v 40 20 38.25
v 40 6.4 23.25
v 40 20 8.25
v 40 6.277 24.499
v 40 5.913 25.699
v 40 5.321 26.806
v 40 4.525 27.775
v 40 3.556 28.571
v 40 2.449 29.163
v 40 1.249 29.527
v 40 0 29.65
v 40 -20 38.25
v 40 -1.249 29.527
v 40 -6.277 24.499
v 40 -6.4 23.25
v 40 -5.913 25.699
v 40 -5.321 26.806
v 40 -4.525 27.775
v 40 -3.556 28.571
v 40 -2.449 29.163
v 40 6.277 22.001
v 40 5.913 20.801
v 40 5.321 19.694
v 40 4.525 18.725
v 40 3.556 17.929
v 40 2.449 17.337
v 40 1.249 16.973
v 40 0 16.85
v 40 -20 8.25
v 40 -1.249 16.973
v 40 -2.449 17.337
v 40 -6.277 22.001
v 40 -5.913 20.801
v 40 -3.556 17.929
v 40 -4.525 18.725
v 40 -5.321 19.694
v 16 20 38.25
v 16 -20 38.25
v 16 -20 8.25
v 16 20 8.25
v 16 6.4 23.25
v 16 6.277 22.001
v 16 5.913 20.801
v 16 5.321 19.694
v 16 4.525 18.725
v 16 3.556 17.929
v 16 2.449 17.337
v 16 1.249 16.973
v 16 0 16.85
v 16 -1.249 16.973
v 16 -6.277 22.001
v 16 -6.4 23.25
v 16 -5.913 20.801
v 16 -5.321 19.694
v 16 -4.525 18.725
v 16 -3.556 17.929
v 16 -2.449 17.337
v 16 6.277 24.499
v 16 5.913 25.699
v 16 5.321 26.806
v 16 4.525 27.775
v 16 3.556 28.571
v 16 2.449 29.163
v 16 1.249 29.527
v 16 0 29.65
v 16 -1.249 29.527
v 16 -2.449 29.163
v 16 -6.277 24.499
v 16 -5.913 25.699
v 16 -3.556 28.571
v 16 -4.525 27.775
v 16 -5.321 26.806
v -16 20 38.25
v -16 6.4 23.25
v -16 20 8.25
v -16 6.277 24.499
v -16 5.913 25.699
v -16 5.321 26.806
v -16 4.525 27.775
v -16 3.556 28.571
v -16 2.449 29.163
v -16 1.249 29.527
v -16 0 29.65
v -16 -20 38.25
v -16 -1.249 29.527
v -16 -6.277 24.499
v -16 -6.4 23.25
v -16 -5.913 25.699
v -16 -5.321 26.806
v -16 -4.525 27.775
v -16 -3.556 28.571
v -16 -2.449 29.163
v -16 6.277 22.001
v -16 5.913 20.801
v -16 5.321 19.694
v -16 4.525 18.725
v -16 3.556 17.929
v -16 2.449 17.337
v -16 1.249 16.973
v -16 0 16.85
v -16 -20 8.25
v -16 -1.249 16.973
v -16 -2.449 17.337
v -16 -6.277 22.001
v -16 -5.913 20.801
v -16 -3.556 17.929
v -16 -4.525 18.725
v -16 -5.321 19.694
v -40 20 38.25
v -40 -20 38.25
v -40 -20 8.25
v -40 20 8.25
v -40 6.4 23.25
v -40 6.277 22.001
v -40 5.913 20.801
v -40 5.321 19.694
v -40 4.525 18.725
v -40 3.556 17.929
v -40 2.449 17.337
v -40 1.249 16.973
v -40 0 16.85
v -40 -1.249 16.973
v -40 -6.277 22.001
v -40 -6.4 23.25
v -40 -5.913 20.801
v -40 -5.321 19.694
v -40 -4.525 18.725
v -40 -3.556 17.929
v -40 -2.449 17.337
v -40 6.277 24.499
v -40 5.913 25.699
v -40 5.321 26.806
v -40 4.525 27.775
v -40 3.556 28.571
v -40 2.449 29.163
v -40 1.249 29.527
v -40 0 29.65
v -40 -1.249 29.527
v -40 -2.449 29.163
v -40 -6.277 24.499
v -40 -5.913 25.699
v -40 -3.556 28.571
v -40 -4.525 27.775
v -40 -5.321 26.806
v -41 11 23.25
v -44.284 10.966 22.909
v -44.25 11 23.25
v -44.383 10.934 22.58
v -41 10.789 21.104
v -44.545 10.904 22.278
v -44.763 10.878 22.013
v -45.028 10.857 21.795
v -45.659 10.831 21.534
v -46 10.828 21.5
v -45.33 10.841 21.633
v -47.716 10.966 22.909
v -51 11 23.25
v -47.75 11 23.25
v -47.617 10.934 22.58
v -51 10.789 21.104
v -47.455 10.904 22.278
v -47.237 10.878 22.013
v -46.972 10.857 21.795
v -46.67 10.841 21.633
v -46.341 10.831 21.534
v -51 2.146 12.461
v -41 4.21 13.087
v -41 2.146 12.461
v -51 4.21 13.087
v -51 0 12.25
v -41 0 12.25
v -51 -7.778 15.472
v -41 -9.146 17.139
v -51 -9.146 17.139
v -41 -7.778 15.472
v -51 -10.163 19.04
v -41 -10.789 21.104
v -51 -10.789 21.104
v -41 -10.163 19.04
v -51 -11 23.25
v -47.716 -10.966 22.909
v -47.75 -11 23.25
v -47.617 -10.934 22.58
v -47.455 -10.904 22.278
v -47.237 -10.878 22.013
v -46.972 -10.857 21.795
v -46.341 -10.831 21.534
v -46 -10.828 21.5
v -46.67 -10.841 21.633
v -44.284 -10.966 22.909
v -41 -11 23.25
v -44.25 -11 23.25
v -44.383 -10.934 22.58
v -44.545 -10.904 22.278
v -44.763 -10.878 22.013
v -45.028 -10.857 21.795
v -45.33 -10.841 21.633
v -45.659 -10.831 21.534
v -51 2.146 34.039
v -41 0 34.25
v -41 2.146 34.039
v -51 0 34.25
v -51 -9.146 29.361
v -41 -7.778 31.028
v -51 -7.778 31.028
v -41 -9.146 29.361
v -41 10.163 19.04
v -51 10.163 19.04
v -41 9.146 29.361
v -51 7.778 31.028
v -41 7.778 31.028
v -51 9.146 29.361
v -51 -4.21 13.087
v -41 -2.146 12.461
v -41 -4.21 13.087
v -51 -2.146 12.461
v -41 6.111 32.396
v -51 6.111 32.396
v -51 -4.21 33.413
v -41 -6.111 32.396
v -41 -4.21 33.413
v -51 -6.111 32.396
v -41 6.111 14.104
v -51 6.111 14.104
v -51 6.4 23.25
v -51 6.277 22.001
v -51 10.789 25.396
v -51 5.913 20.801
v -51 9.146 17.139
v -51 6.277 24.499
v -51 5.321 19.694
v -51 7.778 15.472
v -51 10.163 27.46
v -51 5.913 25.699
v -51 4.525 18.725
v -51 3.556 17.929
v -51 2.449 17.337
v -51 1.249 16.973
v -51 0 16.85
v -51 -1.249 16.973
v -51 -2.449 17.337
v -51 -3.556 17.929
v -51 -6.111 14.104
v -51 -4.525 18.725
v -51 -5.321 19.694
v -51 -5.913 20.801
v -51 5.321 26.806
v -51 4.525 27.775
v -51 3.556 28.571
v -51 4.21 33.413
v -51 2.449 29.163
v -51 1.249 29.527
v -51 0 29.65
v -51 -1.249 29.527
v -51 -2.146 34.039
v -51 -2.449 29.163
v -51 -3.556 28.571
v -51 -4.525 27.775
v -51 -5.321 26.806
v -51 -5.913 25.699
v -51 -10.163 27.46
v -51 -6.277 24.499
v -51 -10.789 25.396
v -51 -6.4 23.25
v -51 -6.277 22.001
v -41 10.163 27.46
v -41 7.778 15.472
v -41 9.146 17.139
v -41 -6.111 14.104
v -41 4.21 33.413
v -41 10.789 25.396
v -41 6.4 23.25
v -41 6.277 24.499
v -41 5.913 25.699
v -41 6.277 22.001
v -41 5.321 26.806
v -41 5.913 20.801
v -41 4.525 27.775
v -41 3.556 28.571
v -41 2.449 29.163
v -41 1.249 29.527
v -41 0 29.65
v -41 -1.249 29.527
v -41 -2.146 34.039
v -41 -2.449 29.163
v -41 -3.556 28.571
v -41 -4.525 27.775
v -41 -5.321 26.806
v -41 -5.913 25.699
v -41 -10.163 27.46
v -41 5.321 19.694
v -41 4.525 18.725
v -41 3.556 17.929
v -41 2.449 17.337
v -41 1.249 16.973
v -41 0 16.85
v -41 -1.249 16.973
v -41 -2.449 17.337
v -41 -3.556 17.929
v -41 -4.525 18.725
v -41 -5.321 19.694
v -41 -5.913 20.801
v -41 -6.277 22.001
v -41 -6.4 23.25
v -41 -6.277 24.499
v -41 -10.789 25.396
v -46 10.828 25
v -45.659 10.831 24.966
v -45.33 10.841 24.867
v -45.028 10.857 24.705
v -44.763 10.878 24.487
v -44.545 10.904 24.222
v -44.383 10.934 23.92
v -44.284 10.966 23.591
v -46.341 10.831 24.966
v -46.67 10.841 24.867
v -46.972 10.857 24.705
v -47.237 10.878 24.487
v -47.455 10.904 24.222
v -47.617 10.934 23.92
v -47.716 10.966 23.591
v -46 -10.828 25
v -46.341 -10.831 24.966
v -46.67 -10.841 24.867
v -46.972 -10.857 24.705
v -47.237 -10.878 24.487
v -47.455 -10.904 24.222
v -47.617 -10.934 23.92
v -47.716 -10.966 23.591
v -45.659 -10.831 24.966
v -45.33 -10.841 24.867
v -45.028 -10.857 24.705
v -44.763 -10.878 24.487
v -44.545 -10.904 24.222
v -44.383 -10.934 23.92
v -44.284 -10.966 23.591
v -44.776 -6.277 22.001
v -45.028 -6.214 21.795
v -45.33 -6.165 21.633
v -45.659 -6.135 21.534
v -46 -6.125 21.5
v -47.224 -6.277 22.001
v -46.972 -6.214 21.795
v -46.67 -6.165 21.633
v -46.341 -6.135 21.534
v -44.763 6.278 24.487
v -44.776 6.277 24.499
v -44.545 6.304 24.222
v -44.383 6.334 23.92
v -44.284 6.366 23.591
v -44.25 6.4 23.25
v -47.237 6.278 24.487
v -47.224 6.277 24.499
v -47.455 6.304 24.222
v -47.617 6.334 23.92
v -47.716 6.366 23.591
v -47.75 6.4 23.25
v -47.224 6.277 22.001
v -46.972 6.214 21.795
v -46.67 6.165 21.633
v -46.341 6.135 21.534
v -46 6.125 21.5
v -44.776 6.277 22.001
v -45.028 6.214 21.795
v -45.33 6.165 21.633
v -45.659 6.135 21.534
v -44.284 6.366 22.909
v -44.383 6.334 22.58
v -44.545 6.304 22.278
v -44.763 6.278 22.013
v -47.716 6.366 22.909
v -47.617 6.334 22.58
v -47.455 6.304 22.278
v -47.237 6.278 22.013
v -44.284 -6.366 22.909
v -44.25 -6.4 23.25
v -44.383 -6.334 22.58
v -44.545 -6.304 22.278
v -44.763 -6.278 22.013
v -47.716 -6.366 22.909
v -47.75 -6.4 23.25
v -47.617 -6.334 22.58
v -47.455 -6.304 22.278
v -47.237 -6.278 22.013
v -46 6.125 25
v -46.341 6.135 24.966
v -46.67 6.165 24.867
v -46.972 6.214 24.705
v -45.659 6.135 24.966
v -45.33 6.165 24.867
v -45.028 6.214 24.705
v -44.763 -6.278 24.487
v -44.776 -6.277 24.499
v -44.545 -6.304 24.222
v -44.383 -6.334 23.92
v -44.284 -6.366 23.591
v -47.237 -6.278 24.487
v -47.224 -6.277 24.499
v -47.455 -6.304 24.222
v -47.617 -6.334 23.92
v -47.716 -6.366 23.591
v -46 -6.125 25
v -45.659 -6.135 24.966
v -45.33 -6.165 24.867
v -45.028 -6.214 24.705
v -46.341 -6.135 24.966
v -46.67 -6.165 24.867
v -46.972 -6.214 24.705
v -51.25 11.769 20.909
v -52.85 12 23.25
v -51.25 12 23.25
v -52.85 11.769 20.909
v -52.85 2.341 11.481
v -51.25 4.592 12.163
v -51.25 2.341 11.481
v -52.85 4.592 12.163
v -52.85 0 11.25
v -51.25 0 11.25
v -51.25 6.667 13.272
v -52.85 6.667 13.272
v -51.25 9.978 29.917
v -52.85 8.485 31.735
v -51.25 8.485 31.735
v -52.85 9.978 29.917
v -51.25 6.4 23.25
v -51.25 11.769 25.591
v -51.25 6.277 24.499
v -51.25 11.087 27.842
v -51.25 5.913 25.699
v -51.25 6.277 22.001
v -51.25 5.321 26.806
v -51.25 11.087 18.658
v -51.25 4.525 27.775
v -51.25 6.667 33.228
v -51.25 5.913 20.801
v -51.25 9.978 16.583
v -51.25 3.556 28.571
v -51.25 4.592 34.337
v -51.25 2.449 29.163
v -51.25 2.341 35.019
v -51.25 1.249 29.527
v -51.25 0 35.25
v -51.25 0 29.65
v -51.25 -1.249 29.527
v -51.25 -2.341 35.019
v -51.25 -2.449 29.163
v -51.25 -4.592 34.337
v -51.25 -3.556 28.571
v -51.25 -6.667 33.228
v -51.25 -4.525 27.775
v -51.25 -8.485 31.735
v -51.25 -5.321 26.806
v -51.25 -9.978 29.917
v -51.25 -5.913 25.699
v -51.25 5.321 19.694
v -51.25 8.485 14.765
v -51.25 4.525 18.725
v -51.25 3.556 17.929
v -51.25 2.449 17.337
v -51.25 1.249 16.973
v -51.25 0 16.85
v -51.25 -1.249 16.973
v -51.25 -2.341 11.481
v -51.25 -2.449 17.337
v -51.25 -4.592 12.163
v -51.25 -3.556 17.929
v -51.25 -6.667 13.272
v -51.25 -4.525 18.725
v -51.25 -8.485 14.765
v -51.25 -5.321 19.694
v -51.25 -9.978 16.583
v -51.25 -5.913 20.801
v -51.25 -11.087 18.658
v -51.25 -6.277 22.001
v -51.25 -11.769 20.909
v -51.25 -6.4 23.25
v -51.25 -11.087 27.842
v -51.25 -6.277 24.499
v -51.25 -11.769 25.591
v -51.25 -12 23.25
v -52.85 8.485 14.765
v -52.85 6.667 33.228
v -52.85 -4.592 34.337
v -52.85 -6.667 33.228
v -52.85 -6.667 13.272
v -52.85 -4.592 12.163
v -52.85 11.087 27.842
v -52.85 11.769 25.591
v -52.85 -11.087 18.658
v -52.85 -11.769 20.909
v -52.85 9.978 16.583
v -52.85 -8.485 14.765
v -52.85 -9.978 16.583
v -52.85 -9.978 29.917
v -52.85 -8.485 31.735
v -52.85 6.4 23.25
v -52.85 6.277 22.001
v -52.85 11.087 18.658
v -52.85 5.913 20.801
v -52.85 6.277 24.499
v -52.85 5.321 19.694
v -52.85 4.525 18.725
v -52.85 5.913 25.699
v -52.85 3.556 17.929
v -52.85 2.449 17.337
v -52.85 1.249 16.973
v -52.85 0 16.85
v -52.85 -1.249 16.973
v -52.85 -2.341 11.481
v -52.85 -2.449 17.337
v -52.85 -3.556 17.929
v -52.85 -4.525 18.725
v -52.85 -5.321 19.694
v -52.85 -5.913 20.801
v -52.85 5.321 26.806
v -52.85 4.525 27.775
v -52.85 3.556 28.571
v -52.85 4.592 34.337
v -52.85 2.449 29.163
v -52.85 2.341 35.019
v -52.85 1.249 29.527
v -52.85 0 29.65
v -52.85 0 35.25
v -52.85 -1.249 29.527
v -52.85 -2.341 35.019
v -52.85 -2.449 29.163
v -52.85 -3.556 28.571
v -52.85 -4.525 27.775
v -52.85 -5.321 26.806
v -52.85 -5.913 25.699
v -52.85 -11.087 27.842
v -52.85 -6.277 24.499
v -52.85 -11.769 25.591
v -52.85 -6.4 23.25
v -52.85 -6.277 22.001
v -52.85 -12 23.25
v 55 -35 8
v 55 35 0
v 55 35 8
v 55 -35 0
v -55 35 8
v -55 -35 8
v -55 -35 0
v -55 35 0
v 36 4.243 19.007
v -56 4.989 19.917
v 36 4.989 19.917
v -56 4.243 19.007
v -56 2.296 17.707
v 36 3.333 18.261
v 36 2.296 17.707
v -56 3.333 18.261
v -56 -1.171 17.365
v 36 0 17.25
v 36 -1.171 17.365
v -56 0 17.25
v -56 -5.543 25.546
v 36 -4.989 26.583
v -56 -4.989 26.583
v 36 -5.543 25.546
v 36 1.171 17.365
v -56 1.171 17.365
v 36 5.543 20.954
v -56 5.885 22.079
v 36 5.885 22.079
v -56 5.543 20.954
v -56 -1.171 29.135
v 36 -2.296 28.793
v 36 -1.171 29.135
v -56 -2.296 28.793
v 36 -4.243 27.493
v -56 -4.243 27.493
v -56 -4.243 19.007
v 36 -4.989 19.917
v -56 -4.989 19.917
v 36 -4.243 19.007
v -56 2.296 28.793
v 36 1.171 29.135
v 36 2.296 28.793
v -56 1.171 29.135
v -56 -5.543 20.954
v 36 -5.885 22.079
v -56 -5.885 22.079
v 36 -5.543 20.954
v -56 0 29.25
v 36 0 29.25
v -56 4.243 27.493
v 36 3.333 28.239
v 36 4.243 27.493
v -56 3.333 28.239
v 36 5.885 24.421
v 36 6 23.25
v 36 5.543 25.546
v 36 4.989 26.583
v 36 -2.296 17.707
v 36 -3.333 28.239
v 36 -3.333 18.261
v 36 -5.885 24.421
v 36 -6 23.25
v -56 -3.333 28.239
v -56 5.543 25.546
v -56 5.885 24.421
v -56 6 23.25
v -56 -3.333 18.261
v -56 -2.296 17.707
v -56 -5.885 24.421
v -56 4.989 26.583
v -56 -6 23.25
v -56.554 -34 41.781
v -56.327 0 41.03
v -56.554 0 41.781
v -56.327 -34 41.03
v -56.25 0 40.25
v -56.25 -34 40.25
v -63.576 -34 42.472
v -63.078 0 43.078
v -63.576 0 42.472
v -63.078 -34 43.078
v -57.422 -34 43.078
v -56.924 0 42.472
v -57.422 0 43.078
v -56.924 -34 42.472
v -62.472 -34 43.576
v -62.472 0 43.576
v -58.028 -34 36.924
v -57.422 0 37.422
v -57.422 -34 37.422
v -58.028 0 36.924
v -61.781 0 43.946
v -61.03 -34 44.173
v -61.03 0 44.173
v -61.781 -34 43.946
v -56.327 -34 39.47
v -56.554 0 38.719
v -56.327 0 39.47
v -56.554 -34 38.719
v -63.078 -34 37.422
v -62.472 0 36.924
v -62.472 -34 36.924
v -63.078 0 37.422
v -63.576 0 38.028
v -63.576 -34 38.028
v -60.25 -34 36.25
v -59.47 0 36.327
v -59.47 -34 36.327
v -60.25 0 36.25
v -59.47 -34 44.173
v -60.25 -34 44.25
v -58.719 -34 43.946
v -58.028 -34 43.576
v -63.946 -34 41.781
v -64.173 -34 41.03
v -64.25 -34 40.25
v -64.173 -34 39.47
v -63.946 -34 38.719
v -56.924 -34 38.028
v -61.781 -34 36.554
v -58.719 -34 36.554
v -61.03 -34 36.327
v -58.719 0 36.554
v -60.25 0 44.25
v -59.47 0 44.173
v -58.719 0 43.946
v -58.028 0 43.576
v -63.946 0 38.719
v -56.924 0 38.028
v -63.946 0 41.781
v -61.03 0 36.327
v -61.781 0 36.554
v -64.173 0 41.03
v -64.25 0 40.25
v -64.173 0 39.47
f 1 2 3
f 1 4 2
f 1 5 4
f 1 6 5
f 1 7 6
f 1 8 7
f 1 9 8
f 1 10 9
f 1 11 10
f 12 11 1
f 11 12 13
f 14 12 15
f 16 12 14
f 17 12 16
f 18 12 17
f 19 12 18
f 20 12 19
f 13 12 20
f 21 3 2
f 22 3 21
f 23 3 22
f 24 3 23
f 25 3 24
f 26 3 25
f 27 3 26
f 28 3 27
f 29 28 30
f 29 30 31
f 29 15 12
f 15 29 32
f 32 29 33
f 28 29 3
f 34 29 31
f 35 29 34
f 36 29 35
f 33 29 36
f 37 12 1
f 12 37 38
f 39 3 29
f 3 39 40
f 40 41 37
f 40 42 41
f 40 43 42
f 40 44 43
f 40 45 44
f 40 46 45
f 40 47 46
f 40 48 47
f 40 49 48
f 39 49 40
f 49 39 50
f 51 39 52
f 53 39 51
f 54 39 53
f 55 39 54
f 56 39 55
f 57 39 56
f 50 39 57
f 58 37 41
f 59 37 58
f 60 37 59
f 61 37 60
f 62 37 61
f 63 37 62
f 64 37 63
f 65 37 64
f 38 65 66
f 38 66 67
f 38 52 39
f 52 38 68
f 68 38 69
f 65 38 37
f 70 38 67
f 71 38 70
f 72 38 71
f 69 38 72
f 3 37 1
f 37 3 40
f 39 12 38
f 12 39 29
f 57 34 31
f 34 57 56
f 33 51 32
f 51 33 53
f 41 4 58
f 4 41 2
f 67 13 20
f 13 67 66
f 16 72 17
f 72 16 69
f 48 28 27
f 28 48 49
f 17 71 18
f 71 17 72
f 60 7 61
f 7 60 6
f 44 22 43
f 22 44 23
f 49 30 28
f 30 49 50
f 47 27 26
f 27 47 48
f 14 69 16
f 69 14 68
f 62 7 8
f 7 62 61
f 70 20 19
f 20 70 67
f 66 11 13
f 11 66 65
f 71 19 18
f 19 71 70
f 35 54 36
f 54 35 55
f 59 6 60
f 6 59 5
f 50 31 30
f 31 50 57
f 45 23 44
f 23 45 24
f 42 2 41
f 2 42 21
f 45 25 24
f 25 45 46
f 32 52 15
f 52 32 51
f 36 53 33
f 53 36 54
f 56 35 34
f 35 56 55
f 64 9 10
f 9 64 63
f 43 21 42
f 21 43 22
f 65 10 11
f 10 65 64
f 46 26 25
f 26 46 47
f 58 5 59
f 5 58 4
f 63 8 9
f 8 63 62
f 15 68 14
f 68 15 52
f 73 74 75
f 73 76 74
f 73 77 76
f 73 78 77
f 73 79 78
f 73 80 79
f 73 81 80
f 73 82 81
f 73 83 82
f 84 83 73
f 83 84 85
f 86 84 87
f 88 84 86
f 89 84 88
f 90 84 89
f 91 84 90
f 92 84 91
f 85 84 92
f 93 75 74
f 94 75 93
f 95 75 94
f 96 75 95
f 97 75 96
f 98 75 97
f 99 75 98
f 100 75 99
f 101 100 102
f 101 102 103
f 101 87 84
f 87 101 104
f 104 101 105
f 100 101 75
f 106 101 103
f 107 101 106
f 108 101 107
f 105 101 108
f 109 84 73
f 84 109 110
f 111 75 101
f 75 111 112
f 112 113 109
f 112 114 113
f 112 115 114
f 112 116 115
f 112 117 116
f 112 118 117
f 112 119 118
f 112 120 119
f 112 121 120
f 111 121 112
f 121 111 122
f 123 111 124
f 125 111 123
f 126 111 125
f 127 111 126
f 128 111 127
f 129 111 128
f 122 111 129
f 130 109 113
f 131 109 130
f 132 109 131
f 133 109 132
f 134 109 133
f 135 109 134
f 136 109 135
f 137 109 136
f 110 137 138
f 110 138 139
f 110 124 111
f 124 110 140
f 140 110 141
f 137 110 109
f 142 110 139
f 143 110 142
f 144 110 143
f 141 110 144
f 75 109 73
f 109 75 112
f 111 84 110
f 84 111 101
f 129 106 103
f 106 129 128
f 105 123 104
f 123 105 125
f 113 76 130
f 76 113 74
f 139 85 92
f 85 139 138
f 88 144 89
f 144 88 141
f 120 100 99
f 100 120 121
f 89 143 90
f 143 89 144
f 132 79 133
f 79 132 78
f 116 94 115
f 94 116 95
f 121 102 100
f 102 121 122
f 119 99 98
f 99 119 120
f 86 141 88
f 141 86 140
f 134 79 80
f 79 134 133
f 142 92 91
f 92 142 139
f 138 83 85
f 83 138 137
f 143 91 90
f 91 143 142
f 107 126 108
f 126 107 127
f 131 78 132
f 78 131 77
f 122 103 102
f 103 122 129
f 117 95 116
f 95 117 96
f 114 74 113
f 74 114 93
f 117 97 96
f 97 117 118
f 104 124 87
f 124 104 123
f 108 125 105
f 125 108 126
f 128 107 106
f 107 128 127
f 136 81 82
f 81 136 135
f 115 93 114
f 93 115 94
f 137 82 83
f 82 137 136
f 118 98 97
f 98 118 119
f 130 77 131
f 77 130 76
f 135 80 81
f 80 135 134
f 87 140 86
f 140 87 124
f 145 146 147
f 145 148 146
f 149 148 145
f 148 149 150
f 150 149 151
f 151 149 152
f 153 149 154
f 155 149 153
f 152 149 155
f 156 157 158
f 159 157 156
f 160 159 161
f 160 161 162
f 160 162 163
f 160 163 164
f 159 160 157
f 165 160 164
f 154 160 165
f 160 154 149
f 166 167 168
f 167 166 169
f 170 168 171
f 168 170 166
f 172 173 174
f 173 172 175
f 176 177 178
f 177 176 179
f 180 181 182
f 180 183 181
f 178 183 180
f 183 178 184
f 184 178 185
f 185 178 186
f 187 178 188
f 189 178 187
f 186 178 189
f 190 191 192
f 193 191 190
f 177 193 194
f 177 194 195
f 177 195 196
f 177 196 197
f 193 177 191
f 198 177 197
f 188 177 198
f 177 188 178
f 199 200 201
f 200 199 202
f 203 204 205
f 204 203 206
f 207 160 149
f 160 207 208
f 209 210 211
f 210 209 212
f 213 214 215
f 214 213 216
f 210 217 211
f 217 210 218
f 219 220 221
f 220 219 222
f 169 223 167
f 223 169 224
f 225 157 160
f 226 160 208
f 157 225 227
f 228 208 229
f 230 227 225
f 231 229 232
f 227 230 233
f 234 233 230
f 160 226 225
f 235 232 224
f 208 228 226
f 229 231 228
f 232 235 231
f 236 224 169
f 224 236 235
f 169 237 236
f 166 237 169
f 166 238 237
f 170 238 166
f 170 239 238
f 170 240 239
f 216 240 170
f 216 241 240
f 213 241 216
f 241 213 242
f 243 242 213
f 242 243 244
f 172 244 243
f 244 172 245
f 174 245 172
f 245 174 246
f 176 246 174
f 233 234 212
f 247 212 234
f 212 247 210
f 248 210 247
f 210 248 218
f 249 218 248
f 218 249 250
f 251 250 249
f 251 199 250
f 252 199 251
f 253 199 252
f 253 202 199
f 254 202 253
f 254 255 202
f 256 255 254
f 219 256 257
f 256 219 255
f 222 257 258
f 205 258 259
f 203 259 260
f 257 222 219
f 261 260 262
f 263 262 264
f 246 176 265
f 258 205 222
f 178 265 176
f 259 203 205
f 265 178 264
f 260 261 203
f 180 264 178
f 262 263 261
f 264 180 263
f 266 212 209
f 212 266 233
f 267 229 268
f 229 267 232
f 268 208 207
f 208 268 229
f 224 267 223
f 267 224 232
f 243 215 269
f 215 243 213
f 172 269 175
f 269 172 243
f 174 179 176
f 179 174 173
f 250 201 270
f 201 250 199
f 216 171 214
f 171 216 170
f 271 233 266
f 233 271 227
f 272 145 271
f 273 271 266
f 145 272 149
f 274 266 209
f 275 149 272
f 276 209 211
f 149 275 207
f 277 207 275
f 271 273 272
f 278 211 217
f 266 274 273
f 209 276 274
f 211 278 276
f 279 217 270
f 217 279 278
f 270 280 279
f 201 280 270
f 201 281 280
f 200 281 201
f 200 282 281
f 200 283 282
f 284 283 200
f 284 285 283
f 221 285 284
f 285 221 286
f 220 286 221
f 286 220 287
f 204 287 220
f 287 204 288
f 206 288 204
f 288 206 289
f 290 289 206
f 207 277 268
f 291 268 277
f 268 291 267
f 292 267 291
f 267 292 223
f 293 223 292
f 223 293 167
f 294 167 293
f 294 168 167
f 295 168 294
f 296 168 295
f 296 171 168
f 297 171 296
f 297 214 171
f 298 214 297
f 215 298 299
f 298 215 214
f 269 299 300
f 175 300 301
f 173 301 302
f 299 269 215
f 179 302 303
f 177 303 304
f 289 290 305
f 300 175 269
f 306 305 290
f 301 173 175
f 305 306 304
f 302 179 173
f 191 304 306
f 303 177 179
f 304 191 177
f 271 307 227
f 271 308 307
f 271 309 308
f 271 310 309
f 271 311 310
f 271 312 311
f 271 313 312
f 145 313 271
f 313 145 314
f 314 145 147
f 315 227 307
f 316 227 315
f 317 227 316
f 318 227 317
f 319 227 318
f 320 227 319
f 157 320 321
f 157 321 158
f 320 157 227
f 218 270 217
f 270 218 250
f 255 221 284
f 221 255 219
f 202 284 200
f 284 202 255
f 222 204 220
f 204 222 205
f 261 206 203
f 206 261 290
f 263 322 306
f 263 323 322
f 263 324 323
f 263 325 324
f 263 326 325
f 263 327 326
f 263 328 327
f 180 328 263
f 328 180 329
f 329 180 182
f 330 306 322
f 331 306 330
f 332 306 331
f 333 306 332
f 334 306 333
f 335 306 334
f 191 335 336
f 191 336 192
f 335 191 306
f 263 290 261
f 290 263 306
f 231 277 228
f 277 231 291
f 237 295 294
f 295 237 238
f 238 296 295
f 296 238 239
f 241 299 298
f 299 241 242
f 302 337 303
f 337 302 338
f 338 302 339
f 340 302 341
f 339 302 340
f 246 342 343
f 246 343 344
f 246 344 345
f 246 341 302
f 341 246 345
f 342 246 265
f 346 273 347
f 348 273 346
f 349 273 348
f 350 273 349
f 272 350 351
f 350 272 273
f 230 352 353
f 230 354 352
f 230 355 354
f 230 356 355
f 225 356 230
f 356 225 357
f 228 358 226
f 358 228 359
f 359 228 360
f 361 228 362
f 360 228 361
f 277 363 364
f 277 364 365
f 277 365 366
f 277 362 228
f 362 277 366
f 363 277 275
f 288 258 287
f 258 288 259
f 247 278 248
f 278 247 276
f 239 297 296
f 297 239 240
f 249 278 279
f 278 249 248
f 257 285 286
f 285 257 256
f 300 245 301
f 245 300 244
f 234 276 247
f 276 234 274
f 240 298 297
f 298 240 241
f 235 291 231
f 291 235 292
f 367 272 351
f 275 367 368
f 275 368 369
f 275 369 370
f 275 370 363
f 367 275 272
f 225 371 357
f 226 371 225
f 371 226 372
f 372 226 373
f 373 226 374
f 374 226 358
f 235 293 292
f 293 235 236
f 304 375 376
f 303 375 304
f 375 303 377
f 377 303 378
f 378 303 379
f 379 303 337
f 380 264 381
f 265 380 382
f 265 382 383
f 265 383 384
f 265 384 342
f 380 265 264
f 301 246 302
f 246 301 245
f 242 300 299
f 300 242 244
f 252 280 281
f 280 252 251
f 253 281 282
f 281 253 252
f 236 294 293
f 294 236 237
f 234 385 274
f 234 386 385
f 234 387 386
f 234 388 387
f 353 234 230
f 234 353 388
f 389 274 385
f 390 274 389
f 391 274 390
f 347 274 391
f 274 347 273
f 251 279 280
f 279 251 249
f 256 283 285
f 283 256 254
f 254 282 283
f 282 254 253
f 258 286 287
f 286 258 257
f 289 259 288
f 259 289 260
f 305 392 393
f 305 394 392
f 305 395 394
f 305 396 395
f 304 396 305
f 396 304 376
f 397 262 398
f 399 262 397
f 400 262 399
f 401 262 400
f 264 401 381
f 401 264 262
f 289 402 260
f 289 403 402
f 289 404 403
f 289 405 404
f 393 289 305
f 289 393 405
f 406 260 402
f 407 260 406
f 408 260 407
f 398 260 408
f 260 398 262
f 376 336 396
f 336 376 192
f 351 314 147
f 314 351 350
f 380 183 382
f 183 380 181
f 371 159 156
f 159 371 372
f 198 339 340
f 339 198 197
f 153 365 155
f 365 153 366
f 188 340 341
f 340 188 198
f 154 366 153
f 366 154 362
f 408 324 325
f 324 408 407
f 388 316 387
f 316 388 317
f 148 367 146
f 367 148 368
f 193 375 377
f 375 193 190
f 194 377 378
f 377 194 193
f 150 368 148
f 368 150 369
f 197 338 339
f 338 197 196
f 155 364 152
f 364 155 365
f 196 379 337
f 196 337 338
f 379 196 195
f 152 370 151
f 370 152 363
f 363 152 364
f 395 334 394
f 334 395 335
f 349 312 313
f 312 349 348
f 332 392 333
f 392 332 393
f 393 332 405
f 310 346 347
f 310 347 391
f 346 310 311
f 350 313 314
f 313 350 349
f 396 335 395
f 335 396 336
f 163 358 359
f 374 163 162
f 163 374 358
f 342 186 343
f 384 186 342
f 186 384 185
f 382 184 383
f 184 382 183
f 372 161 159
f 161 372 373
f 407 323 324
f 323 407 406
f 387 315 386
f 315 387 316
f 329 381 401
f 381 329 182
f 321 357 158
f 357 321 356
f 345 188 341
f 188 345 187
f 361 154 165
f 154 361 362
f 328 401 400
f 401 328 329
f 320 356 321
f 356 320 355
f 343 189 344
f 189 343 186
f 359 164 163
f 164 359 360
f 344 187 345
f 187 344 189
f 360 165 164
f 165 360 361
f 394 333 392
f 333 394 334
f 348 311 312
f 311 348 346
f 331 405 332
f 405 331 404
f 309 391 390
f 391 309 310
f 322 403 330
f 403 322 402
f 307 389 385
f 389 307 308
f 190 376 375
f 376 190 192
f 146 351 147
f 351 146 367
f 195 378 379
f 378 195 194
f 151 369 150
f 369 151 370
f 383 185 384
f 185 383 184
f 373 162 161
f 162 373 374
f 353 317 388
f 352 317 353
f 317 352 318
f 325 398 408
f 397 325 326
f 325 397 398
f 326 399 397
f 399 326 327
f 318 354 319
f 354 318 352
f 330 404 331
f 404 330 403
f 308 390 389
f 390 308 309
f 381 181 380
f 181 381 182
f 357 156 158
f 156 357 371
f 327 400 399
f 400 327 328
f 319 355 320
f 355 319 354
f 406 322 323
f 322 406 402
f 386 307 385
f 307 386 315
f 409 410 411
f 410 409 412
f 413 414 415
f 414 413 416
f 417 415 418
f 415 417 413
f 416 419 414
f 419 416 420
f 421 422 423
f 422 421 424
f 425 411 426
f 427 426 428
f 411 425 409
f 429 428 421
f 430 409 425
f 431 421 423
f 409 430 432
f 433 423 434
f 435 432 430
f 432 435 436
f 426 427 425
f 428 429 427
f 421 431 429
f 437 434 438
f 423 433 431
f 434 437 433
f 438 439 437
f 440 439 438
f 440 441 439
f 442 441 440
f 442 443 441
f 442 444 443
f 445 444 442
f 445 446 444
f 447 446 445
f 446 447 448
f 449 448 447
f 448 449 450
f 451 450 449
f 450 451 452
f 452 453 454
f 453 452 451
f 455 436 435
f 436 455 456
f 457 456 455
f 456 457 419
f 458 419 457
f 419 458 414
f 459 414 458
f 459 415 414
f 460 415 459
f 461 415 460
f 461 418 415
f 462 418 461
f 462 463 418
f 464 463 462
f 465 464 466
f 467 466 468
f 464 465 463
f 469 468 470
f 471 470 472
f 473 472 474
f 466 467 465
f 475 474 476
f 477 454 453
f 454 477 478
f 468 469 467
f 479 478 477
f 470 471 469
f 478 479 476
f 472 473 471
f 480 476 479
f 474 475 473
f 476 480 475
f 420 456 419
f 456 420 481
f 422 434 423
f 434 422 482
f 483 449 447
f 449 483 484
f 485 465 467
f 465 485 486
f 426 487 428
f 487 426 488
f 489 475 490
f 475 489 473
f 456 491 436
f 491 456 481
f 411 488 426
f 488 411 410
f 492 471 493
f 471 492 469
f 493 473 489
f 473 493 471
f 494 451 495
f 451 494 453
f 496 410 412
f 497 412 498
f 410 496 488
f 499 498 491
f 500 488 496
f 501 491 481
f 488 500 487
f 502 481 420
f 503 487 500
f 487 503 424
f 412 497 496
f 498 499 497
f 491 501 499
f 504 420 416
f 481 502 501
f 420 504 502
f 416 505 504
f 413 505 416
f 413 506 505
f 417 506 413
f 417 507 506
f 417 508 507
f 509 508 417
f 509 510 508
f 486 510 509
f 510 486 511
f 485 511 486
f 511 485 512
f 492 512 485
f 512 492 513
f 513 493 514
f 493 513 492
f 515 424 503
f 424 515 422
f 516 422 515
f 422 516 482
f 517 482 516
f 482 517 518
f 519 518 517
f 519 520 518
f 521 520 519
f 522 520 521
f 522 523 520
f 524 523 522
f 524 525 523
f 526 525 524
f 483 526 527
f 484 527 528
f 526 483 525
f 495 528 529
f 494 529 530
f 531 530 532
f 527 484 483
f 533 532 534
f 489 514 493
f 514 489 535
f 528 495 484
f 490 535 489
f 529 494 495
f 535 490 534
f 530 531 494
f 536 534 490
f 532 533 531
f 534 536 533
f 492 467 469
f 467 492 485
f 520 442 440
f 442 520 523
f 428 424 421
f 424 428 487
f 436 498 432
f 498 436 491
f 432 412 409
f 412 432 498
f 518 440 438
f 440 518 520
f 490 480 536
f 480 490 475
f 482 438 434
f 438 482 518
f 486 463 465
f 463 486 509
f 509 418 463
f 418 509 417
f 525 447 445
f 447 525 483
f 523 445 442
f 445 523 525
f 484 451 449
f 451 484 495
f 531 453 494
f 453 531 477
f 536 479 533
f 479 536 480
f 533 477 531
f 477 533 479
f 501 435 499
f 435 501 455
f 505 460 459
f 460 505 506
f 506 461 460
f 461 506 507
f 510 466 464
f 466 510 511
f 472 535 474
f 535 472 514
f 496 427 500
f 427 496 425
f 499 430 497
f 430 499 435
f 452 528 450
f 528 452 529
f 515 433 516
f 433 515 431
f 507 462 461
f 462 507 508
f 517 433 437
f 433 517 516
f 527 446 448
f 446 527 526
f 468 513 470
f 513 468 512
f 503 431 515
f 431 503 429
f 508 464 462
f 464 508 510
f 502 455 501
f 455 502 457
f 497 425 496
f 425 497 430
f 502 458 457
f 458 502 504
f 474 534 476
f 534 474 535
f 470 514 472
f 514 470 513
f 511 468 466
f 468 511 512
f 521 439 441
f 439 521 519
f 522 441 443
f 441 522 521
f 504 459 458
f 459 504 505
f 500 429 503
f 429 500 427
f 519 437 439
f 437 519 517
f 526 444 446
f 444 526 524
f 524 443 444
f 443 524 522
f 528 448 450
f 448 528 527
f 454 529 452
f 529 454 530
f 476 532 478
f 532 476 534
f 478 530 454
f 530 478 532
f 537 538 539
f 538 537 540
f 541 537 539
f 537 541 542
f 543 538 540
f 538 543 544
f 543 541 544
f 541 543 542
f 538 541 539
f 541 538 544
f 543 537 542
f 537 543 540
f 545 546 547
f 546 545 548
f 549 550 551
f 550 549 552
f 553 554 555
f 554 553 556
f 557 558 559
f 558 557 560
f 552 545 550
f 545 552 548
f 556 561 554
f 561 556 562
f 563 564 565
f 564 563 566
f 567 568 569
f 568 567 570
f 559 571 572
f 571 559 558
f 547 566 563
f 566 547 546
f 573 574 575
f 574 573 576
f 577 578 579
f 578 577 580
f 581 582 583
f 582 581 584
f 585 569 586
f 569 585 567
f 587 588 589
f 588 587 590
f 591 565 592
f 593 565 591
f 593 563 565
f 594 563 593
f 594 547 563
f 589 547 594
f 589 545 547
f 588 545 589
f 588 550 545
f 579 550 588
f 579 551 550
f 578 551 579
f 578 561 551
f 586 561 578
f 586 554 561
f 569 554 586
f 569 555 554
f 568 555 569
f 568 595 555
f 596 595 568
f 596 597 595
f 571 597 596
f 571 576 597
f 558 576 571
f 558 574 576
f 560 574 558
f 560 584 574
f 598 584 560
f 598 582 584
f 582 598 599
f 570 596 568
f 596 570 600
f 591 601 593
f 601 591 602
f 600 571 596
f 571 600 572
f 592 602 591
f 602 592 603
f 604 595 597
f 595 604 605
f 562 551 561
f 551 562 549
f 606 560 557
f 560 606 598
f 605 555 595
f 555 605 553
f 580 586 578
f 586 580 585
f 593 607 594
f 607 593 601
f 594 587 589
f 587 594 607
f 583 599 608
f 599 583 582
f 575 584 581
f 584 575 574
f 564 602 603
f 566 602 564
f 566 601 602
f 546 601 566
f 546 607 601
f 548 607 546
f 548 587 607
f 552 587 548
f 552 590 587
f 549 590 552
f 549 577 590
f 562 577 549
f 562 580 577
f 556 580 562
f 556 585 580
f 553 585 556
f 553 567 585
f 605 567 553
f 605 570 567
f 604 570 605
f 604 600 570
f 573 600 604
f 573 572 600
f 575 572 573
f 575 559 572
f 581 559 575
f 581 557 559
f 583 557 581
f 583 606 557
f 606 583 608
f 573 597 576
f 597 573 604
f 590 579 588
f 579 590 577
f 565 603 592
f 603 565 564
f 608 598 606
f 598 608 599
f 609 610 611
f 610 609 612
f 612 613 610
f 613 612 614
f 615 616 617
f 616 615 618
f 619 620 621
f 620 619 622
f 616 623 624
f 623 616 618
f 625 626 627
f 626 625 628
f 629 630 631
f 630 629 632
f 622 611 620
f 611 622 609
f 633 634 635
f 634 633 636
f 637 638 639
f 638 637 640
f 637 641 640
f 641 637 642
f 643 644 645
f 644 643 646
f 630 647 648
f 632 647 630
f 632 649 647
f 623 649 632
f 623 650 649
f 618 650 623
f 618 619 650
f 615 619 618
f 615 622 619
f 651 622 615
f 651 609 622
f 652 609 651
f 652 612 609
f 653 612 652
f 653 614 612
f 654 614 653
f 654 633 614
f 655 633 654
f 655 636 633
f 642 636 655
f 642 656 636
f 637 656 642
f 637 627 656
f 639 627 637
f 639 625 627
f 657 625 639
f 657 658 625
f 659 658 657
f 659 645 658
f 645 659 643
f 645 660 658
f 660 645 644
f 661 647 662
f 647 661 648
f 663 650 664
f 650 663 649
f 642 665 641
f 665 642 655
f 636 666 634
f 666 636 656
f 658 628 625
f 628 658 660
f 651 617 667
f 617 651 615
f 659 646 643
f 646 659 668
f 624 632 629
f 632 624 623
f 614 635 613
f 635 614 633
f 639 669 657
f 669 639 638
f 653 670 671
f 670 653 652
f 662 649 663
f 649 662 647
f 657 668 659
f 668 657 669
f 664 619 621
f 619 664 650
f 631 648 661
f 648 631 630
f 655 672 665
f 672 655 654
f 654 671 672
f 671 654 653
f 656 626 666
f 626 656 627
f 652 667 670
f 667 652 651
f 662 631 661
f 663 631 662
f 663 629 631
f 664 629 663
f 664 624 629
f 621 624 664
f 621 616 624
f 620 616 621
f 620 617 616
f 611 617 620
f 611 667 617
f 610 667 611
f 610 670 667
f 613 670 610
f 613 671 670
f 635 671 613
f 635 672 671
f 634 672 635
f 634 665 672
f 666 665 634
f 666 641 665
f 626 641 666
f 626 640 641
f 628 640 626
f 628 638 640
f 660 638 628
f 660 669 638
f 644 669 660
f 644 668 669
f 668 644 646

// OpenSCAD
$fn = 32;

// ------------------------------------------------------------------------
// Machine vise: screw d12, jaws 24 x 30 mm
// Every part is its own module, assembly() places every instance.
// ------------------------------------------------------------------------

// --- part 1 ---
module vise_bed() {
  difference() {
    translate([-55, -35, 0]) cube([110, 70, 8]);
  }
}

// --- part 2 ---
module vise_jaw() {
  difference() {
    translate([-12, -20, 0]) cube([24, 40, 30]);
    translate([0, 0, 15]) rotate([0, 90, 0]) cylinder(h = 26, d = 12.8, center = true);
  }
}

// --- part 3 ---
module vise_screw() {
  translate([0, 0, -46]) cylinder(h = 92, d = 12);
}

// --- part 4 ---
module screw_collar() {
  difference() {
    cylinder(h = 10, d = 22);
    translate([0, 0, -1]) cylinder(h = 12, d = 12.8);
    translate([0, 0, 5]) rotate([90, 0, 0]) cylinder(h = 24, d = 3.5, center = true);
  }
}

// --- part 5 ---
module screw_washer() {
  difference() {
      translate([0, 0, 0]) cylinder(h = 1.6, d = 24);
      translate([0, 0, -1]) cylinder(h = 3.6, d = 12.8);
    }
}

// --- part 6 ---
module vise_handle() {
  cylinder(h = 34, d = 8);
}

// --- assembly ---
module assembly() {
  color([0.80, 0.24, 0.20]) translate([0, 0, 0]) rotate([0, 0, 0]) vise_bed();
  color([0.20, 0.45, 0.75]) translate([28, 0, 8.25]) rotate([0, 0, 0]) vise_jaw();
  color([0.25, 0.62, 0.32]) translate([-28, 0, 8.25]) rotate([0, 0, 0]) vise_jaw();
  color([0.92, 0.70, 0.18]) translate([-10, 0, 23.25]) rotate([0, 90, 0]) vise_screw();
  color([0.58, 0.35, 0.70]) translate([-51, 0, 23.25]) rotate([0, 90, 0]) screw_collar();
  color([0.16, 0.66, 0.66]) translate([-52.85, 0, 23.25]) rotate([0, 90, 0]) screw_washer();
  color([0.85, 0.48, 0.18]) translate([-60.25, 0, 40.25]) rotate([90, 0, 0]) vise_handle();
}

assembly();
